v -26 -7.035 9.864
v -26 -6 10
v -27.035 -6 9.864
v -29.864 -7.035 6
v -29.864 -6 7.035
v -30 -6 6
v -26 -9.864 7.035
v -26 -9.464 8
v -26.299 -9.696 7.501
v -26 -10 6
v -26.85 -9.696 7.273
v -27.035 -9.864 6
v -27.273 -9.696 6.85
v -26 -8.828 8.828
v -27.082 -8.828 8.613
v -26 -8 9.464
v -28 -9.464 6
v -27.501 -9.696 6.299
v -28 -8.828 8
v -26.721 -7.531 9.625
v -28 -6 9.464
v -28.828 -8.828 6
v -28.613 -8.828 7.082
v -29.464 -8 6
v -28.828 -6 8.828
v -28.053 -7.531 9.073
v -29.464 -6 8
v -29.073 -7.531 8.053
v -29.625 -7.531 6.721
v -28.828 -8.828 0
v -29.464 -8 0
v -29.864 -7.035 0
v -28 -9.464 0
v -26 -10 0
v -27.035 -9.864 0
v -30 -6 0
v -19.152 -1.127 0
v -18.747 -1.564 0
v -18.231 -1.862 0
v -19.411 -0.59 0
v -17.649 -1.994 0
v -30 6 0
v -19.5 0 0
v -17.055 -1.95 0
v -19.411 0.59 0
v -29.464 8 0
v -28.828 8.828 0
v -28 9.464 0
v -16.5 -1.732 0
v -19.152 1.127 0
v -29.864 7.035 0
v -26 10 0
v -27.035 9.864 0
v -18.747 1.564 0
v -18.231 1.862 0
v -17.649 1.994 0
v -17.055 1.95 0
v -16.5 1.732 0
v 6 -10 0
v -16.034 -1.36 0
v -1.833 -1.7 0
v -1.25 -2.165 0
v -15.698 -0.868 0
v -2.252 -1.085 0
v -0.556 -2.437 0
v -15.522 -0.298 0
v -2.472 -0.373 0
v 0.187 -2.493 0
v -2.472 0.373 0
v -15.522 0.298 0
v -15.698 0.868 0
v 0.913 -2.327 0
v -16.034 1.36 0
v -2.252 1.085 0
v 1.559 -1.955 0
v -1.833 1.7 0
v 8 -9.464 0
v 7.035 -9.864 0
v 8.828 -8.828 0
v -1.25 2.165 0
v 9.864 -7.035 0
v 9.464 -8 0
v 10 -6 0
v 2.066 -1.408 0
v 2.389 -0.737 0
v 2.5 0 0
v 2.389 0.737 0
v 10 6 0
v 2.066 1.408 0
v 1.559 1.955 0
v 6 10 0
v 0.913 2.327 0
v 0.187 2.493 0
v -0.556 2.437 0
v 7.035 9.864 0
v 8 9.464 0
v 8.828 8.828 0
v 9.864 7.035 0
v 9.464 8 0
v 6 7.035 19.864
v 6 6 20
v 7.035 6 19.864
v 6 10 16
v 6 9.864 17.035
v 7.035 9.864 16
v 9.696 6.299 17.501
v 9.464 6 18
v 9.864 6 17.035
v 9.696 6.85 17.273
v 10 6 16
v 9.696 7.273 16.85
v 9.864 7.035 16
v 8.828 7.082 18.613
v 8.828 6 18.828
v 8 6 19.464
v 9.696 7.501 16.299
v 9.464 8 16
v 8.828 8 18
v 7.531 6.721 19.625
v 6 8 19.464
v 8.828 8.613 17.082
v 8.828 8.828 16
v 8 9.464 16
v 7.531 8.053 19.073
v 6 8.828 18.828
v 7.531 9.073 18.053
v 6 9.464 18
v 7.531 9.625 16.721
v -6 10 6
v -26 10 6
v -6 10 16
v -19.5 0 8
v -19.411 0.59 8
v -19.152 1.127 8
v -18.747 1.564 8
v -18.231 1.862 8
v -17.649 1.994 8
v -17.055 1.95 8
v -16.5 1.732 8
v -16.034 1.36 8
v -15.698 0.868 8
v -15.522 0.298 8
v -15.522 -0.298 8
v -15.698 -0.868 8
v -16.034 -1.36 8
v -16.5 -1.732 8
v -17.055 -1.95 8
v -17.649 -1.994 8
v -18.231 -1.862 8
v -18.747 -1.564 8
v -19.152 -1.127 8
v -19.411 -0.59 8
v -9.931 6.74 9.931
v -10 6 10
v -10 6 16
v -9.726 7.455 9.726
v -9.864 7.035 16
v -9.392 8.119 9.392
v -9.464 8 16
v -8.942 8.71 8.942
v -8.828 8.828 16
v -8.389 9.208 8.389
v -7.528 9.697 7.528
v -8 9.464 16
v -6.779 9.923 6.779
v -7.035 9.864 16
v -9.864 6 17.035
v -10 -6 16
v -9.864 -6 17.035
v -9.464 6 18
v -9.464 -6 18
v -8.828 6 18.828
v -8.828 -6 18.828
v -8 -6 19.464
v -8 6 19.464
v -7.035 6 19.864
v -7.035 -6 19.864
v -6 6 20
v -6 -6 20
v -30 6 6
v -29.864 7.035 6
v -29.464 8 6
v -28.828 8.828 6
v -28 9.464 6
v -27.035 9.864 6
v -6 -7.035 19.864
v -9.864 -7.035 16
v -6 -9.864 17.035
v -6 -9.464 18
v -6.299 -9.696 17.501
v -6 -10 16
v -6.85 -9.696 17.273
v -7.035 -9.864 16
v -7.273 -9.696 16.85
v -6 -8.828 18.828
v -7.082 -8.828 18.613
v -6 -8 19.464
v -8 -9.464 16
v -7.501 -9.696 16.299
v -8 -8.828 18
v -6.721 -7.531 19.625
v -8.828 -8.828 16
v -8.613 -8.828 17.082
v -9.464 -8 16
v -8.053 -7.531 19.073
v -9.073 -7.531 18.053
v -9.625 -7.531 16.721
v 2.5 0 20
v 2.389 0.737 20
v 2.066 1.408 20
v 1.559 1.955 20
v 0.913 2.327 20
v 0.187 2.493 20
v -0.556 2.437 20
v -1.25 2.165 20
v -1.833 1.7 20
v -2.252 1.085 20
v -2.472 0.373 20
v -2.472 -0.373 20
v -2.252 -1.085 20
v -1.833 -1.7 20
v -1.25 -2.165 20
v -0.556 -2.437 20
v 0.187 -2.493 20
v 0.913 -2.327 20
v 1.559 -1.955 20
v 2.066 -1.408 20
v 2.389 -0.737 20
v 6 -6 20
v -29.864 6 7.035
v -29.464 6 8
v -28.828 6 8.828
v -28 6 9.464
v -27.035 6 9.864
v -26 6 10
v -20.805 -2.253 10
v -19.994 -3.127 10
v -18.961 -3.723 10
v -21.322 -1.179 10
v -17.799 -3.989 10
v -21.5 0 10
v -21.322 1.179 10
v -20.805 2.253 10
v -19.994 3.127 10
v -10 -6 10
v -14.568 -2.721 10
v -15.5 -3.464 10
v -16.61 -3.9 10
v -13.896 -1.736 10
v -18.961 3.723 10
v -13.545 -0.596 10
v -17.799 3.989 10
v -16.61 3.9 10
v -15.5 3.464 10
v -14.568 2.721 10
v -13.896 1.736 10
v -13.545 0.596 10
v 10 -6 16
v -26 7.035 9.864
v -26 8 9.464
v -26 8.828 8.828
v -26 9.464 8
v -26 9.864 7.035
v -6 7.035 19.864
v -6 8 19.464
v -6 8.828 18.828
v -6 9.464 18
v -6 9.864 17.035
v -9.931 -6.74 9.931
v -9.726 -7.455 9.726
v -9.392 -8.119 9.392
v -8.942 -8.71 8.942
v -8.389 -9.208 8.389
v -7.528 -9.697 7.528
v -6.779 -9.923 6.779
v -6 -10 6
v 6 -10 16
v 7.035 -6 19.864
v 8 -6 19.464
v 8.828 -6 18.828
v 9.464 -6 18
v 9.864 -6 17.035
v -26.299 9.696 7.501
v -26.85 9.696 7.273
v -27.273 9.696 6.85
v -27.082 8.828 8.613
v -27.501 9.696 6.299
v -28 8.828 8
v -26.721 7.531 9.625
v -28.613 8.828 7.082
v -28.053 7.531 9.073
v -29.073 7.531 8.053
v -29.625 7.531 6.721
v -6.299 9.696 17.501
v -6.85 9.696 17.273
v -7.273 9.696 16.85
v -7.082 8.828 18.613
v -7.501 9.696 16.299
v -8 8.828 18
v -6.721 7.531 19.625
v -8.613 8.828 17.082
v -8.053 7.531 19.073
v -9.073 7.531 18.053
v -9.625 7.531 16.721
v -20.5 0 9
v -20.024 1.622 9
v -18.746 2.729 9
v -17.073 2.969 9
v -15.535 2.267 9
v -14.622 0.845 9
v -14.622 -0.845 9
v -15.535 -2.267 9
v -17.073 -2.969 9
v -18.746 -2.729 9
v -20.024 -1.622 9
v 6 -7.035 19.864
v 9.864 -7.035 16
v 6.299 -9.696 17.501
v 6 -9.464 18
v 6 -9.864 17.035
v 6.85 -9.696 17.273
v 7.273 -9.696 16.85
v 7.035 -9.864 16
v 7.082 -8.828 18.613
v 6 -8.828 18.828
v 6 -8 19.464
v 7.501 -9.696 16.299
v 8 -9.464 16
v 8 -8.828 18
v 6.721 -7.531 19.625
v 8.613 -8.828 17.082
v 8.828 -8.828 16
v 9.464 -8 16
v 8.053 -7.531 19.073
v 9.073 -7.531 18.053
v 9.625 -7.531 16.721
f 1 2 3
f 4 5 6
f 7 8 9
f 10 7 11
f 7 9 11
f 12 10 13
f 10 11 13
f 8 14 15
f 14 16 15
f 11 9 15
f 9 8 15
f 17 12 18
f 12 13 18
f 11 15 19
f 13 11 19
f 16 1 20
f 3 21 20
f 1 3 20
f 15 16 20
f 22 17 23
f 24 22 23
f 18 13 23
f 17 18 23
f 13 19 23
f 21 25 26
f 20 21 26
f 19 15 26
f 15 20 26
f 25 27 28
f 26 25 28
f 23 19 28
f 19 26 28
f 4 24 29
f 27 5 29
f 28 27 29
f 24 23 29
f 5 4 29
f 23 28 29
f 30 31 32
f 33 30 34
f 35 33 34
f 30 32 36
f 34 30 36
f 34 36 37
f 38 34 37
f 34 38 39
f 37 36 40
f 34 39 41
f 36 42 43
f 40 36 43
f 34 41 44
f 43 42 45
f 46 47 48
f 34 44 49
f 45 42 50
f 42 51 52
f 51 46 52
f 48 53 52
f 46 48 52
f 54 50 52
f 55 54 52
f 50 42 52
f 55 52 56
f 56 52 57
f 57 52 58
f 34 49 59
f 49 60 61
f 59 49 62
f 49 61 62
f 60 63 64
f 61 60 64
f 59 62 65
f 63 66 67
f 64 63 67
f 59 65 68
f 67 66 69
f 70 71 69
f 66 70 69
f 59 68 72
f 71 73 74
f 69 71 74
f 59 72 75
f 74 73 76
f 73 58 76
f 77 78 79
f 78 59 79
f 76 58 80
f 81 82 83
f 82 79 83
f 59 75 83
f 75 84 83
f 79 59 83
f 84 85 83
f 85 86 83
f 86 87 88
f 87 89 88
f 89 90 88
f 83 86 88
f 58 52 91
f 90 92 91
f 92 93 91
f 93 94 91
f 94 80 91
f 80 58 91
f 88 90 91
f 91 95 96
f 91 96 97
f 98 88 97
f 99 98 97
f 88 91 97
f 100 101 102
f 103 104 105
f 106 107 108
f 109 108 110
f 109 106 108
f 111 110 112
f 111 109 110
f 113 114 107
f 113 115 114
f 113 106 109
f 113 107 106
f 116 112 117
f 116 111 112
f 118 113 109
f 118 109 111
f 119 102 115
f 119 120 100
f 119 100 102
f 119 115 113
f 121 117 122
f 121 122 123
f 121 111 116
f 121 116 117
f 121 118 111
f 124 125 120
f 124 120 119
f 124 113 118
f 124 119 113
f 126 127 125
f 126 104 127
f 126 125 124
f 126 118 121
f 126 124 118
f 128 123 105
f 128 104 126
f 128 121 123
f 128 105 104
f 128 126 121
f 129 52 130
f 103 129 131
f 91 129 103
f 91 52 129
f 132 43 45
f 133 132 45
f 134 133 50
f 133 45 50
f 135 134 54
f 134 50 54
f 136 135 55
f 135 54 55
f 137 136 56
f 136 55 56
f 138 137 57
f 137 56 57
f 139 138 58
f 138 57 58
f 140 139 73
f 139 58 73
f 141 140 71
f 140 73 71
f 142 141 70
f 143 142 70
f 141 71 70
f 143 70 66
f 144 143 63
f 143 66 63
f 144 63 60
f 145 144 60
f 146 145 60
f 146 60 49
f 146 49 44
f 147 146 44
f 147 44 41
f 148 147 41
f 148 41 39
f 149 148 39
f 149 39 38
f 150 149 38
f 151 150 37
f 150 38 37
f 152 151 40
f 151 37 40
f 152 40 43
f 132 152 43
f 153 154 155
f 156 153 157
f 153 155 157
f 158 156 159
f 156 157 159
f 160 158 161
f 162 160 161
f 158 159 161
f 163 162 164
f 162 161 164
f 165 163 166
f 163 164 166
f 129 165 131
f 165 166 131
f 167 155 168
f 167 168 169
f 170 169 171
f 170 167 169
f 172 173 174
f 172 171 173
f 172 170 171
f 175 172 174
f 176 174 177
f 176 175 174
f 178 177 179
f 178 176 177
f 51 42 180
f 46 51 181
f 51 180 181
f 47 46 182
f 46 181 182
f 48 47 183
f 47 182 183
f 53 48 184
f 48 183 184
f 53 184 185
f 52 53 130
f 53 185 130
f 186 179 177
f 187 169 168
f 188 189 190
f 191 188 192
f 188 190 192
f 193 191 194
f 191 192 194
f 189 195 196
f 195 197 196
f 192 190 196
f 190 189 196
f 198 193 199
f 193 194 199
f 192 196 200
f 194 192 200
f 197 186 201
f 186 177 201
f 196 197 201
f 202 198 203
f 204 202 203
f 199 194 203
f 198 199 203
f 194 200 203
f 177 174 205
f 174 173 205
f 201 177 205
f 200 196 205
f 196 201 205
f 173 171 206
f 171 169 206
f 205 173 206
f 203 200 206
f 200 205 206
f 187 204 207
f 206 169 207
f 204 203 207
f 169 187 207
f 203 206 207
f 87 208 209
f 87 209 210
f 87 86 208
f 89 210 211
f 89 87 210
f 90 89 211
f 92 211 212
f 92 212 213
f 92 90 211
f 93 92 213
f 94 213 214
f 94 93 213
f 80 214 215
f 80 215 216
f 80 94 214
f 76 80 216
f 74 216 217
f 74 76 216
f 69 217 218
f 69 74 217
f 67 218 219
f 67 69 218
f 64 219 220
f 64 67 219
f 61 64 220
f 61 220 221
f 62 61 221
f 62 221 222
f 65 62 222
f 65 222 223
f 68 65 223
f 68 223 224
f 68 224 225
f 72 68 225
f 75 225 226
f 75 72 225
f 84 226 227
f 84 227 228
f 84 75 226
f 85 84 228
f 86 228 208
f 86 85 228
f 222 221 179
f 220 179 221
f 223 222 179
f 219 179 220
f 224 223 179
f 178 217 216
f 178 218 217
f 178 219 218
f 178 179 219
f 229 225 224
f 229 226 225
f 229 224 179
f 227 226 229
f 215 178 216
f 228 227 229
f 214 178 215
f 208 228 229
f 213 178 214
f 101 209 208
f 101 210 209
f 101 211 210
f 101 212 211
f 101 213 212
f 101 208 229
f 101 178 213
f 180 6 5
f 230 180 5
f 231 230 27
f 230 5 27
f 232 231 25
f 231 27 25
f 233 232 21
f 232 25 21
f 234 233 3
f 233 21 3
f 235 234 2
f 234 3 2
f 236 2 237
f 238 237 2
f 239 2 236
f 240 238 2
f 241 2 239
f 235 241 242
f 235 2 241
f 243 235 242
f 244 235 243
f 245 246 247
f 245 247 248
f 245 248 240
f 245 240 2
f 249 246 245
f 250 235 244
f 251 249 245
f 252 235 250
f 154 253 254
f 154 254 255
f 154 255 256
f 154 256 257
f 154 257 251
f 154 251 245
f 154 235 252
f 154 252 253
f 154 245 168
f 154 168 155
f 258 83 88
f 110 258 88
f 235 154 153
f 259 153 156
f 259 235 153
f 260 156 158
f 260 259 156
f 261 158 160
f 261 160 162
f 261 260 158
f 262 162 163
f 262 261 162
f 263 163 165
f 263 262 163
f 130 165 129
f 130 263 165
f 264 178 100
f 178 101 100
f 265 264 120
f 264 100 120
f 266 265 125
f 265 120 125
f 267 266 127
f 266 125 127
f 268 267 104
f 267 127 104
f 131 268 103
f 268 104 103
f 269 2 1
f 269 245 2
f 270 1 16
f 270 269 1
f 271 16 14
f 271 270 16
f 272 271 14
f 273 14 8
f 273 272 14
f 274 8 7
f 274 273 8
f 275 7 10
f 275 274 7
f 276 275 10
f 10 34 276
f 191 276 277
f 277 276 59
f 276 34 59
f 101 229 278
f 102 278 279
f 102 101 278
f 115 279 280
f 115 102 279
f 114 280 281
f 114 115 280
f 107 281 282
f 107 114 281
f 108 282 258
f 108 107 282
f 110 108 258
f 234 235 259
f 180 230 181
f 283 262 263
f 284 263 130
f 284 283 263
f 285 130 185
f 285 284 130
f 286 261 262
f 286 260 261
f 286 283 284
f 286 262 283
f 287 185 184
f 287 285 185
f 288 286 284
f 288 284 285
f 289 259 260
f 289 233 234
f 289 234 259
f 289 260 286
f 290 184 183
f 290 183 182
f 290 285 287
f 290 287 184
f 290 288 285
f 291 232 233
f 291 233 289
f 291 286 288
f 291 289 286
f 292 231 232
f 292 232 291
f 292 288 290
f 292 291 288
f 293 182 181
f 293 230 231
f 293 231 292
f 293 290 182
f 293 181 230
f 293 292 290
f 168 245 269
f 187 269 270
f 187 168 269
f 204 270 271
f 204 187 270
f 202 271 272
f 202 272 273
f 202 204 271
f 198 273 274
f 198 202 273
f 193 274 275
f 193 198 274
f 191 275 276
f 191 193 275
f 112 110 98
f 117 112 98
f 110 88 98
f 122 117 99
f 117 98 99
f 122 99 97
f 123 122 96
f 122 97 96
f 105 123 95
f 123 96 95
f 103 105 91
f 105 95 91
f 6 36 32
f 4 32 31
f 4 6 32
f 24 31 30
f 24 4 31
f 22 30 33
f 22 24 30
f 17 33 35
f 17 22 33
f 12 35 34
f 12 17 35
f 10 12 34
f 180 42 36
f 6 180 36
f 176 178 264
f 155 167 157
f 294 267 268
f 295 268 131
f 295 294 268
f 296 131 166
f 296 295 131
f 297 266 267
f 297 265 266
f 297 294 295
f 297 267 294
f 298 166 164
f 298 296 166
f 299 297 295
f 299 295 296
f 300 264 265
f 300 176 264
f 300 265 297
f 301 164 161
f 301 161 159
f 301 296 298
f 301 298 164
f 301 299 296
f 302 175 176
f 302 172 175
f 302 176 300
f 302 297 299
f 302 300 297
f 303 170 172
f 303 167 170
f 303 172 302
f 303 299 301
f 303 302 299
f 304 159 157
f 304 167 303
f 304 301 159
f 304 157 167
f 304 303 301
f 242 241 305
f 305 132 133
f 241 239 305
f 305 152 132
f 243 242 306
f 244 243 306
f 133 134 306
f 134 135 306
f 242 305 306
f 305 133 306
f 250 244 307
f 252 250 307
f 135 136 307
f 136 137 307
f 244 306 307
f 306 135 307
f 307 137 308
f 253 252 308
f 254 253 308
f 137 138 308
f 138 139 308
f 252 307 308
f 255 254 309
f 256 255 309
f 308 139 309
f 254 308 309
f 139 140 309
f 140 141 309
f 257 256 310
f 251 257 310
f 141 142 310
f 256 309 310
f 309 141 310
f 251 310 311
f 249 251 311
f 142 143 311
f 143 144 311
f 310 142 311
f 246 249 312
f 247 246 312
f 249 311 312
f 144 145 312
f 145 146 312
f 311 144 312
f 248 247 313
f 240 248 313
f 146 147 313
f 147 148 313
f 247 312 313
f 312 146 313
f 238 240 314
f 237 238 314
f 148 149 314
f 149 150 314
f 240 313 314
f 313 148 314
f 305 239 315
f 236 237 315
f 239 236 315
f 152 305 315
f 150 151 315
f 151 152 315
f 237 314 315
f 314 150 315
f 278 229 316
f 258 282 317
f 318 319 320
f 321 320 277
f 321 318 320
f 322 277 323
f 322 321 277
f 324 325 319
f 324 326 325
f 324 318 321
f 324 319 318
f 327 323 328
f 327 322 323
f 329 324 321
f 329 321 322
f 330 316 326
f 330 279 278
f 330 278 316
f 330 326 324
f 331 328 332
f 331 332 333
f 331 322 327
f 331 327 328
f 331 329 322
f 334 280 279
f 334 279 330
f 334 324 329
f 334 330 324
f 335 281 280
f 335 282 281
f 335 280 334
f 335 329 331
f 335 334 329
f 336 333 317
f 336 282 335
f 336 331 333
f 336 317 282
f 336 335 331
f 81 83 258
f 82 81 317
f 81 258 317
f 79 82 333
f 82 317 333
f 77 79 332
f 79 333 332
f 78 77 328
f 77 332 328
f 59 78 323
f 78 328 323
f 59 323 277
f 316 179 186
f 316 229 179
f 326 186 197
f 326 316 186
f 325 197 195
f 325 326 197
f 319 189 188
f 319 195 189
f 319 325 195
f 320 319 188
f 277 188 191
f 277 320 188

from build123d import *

# Parameters (mm, degrees)
F0_R     = 2.5
F1_DEPTH = 10
F2_W     = 20
F2_H     = 20
F2_R     = 2.5
F3_DEPTH = 10
F4_R     = 4
F5_SIZE  = 2


with BuildPart() as f1:
    # F0 (on Top) → F1 (new body)
    with BuildSketch(Plane.XY):
        Polygon((10, 10), (-30, 10), (-30, 0), (-30, -10), (10, -10), align=None)
        with BuildLine():
            ThreePointArc((-15.5, 0), (-17.5, -2), (-19.5, 0))
            ThreePointArc((-19.5, 0), (-17.5, 2), (-15.5, 0))
        make_face(mode=Mode.SUBTRACT)
        Circle(F0_R, mode=Mode.SUBTRACT)
    extrude(amount=F1_DEPTH)

    # F2 (on face) → F3 (join)
    with BuildSketch(Plane.XY.offset(10)):
        Rectangle(F2_W, F2_H)
        Circle(F2_R, mode=Mode.SUBTRACT)
    extrude(amount=F3_DEPTH)

    # F4
    f4_edges = [f1.edges().sort_by_distance(p)[0] for p in [
        (-30, 0, 10),
        (-20, 10, 10),
        (-20, -10, 10),
        (-10, 0, 20),
        (0, 10, 20),
        (10, 0, 20),
        (0, -10, 20),
        (-10, -10, 15),
        (-10, 10, 15),
        (10, 10, 10),
        (10, -10, 10),
        (-30, 10, 5),
        (-30, -10, 5),
    ]]
    fillet(f4_edges, radius=F4_R)

    # F5
    f5_edges = [f1.edges().sort_by_distance(p)[0] for p in [
        (-19.5, 0, 10),
    ]]
    chamfer(f5_edges, length=F5_SIZE)


solid = f1.part
